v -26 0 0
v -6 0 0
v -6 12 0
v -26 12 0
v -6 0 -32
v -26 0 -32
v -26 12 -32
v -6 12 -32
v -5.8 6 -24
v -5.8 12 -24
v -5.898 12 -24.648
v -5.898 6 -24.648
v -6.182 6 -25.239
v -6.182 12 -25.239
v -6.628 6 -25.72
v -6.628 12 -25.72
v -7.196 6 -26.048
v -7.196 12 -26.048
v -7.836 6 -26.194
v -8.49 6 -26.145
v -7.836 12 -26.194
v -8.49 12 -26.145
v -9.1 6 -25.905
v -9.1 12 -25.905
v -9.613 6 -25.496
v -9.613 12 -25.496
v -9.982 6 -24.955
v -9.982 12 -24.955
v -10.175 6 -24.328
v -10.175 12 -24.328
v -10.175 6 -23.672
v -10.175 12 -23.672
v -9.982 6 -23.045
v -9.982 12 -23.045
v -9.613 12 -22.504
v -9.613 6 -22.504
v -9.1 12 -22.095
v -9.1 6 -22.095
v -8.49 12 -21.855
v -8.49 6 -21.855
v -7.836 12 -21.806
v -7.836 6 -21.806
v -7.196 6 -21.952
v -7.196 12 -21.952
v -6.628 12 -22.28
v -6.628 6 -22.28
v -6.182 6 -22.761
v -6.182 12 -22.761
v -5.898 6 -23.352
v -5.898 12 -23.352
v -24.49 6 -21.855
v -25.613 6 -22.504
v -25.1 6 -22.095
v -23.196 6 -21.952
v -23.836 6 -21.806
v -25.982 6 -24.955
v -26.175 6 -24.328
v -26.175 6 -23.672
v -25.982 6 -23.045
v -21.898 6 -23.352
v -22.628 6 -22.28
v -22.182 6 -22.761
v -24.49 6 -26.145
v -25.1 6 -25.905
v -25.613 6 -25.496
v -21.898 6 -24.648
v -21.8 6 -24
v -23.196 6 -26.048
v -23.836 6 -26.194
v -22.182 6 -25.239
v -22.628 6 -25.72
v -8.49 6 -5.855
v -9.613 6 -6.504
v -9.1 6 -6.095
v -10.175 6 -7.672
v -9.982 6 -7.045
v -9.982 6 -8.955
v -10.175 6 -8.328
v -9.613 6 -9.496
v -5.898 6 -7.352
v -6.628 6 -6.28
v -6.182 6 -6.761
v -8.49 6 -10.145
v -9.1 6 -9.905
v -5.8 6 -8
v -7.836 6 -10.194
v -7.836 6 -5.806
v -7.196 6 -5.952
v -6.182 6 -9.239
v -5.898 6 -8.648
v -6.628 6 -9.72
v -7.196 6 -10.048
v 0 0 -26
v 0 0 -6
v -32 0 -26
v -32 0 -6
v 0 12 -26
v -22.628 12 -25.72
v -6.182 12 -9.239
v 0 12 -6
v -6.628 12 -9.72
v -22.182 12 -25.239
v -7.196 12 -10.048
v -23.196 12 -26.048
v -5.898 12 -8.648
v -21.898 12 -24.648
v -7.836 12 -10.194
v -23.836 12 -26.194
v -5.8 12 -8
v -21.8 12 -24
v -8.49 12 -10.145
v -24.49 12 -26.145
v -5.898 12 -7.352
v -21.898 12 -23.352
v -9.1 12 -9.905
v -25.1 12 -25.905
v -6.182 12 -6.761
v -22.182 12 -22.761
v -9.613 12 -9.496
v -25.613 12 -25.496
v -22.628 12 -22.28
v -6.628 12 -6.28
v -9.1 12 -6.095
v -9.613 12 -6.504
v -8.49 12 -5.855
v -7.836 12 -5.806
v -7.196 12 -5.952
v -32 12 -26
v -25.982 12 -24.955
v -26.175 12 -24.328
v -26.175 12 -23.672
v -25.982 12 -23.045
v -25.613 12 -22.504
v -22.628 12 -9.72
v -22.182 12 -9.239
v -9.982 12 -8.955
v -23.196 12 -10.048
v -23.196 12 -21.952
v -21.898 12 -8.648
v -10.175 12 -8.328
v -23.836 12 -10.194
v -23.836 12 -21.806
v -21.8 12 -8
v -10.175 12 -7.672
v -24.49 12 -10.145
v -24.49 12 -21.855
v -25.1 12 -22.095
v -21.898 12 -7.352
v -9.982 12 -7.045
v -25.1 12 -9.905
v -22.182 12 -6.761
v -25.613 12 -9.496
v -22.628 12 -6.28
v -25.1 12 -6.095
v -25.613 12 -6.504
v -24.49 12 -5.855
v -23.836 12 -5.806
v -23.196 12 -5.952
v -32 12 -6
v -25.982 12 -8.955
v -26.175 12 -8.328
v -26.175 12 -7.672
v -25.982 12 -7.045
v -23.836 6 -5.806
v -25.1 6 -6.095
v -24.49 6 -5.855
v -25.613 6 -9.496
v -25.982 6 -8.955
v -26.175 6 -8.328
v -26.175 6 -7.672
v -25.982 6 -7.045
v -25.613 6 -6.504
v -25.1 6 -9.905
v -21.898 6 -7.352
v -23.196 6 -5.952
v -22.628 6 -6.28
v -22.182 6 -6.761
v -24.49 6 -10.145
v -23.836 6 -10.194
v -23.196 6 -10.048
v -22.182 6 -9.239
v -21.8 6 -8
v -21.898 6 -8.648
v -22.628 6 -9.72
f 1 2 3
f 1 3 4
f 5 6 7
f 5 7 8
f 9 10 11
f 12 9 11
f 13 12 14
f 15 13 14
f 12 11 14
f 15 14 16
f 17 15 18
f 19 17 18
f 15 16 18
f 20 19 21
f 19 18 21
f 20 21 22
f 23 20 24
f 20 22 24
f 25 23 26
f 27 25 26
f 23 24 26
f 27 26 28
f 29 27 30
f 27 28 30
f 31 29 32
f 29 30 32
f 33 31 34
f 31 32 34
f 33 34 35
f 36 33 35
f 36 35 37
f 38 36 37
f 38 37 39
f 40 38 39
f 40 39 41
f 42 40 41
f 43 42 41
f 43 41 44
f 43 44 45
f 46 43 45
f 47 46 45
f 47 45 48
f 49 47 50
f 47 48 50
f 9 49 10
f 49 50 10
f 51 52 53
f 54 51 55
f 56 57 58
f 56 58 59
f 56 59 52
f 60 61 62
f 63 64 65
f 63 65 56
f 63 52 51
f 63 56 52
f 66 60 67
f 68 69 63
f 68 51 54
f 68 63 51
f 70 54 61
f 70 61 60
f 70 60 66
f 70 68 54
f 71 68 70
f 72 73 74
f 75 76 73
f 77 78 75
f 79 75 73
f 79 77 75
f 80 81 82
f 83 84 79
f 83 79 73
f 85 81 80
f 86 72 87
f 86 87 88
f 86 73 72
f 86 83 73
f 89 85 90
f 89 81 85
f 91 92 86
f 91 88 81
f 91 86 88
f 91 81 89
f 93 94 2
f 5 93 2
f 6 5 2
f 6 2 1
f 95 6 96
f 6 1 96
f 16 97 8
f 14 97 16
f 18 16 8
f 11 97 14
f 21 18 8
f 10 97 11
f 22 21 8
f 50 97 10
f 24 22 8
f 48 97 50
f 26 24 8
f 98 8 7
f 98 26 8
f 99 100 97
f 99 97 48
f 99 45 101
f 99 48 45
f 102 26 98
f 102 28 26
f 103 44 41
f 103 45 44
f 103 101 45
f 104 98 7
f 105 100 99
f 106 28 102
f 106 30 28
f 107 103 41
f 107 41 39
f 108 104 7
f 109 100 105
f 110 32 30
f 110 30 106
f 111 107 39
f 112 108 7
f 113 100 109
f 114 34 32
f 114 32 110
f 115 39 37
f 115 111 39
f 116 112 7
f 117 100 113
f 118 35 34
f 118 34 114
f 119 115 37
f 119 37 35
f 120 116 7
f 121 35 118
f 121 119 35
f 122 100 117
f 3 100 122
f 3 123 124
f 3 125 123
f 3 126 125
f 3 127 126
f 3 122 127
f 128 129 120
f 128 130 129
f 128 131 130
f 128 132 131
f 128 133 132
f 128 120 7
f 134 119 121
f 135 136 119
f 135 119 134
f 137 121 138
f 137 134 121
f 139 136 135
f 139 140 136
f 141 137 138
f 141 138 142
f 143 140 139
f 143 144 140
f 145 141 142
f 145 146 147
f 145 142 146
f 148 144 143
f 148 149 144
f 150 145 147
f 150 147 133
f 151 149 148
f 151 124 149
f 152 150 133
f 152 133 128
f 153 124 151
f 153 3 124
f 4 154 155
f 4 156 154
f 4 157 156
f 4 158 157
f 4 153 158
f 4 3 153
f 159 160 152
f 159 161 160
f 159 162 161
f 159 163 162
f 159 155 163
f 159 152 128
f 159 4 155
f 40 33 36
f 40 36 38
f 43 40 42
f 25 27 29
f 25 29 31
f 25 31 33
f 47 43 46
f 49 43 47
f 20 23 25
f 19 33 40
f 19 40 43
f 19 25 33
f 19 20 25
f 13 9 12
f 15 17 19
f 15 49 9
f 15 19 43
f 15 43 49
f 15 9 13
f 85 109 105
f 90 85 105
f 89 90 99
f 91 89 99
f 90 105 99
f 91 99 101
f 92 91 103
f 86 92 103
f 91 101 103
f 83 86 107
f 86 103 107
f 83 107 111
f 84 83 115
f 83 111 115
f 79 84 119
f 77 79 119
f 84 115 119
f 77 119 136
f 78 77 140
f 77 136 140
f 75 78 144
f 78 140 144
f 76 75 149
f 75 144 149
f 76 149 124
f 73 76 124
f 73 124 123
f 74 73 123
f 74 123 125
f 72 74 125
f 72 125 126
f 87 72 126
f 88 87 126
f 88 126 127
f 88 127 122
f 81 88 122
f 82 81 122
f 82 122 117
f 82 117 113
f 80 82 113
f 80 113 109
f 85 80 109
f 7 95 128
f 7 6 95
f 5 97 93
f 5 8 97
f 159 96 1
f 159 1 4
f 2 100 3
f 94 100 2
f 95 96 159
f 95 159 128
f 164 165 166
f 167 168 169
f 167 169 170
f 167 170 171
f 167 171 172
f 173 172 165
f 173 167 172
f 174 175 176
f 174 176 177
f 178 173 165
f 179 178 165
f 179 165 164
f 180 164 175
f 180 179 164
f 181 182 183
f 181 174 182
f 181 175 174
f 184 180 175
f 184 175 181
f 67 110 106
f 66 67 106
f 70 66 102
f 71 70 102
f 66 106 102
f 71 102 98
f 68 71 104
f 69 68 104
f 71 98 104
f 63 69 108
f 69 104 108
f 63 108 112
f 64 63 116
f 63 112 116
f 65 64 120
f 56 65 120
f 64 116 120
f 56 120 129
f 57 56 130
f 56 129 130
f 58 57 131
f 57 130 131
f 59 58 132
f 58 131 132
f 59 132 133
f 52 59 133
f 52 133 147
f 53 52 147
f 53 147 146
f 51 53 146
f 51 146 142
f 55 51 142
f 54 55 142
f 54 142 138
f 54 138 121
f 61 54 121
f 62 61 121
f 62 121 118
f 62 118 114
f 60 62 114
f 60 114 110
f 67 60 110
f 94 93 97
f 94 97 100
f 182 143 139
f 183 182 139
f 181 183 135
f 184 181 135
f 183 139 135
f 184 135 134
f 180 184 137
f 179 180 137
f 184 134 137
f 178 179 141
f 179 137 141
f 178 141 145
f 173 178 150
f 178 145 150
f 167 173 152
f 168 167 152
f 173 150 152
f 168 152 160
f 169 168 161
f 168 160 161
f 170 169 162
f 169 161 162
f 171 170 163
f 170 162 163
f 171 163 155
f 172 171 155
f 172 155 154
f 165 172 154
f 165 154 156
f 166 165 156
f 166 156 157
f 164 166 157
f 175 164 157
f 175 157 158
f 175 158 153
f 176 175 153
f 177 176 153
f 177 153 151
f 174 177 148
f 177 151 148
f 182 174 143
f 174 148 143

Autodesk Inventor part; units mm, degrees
ref_plane "YZ Plane" through (0, 0, 0) normal (1, 0, 0) x (0, 1, 0)
ref_plane "XZ Plane" through (0, 0, 0) normal (0, 1, 0) x (-1, 0, 0)
ref_plane "XY Plane" through (0, 0, 0) normal (0, 0, 1) x (1, 0, 0)
sketch "Skizze1" plane through (0, 0, 0) normal (0, 1, 0) x (-1, 0, 0)
  line L0 (0, 0) -> (32, 0)
  line L1 (32, 0) -> (32, -32)
  line L2 (32, -32) -> (0, -32)
  line L3 (0, -32) -> (0, 0)
  dimension "d0" = 32
  dimension "d1" = 32
extrude "Extrusion1" add sketch "Skizze1" along normal blind 12
sketch "Skizze2" plane through (0, 12, 0) normal (0, 1, 0) x (1, 0, 0)
  circle A0 centre (-24, 8) radius 2.2
  line L0 (-32, 32) -> (-32, 0) projected
  line L1 (-32, 0) -> (0, 0) projected
  circle A1 centre (-24, 24) radius 2.2
  circle A2 centre (-8, 8) radius 2.2
  circle A3 centre (-8, 24) radius 2.2
  dimension "d4" = 4.4
  dimension "d6" = 8
  dimension "d7" = 8
  dimension "d10" = 16
  dimension "d13" = 16
extrude "Extrusion2" cut sketch "Skizze2" against normal blind 6
chamfer "Fasen1" distance 6 angle 45 4 edges at (0, 6, 0) (-32, 6, 0) (-32, 6, -32) (0, 6, -32)
properties part number "Steckdosen_Block"
